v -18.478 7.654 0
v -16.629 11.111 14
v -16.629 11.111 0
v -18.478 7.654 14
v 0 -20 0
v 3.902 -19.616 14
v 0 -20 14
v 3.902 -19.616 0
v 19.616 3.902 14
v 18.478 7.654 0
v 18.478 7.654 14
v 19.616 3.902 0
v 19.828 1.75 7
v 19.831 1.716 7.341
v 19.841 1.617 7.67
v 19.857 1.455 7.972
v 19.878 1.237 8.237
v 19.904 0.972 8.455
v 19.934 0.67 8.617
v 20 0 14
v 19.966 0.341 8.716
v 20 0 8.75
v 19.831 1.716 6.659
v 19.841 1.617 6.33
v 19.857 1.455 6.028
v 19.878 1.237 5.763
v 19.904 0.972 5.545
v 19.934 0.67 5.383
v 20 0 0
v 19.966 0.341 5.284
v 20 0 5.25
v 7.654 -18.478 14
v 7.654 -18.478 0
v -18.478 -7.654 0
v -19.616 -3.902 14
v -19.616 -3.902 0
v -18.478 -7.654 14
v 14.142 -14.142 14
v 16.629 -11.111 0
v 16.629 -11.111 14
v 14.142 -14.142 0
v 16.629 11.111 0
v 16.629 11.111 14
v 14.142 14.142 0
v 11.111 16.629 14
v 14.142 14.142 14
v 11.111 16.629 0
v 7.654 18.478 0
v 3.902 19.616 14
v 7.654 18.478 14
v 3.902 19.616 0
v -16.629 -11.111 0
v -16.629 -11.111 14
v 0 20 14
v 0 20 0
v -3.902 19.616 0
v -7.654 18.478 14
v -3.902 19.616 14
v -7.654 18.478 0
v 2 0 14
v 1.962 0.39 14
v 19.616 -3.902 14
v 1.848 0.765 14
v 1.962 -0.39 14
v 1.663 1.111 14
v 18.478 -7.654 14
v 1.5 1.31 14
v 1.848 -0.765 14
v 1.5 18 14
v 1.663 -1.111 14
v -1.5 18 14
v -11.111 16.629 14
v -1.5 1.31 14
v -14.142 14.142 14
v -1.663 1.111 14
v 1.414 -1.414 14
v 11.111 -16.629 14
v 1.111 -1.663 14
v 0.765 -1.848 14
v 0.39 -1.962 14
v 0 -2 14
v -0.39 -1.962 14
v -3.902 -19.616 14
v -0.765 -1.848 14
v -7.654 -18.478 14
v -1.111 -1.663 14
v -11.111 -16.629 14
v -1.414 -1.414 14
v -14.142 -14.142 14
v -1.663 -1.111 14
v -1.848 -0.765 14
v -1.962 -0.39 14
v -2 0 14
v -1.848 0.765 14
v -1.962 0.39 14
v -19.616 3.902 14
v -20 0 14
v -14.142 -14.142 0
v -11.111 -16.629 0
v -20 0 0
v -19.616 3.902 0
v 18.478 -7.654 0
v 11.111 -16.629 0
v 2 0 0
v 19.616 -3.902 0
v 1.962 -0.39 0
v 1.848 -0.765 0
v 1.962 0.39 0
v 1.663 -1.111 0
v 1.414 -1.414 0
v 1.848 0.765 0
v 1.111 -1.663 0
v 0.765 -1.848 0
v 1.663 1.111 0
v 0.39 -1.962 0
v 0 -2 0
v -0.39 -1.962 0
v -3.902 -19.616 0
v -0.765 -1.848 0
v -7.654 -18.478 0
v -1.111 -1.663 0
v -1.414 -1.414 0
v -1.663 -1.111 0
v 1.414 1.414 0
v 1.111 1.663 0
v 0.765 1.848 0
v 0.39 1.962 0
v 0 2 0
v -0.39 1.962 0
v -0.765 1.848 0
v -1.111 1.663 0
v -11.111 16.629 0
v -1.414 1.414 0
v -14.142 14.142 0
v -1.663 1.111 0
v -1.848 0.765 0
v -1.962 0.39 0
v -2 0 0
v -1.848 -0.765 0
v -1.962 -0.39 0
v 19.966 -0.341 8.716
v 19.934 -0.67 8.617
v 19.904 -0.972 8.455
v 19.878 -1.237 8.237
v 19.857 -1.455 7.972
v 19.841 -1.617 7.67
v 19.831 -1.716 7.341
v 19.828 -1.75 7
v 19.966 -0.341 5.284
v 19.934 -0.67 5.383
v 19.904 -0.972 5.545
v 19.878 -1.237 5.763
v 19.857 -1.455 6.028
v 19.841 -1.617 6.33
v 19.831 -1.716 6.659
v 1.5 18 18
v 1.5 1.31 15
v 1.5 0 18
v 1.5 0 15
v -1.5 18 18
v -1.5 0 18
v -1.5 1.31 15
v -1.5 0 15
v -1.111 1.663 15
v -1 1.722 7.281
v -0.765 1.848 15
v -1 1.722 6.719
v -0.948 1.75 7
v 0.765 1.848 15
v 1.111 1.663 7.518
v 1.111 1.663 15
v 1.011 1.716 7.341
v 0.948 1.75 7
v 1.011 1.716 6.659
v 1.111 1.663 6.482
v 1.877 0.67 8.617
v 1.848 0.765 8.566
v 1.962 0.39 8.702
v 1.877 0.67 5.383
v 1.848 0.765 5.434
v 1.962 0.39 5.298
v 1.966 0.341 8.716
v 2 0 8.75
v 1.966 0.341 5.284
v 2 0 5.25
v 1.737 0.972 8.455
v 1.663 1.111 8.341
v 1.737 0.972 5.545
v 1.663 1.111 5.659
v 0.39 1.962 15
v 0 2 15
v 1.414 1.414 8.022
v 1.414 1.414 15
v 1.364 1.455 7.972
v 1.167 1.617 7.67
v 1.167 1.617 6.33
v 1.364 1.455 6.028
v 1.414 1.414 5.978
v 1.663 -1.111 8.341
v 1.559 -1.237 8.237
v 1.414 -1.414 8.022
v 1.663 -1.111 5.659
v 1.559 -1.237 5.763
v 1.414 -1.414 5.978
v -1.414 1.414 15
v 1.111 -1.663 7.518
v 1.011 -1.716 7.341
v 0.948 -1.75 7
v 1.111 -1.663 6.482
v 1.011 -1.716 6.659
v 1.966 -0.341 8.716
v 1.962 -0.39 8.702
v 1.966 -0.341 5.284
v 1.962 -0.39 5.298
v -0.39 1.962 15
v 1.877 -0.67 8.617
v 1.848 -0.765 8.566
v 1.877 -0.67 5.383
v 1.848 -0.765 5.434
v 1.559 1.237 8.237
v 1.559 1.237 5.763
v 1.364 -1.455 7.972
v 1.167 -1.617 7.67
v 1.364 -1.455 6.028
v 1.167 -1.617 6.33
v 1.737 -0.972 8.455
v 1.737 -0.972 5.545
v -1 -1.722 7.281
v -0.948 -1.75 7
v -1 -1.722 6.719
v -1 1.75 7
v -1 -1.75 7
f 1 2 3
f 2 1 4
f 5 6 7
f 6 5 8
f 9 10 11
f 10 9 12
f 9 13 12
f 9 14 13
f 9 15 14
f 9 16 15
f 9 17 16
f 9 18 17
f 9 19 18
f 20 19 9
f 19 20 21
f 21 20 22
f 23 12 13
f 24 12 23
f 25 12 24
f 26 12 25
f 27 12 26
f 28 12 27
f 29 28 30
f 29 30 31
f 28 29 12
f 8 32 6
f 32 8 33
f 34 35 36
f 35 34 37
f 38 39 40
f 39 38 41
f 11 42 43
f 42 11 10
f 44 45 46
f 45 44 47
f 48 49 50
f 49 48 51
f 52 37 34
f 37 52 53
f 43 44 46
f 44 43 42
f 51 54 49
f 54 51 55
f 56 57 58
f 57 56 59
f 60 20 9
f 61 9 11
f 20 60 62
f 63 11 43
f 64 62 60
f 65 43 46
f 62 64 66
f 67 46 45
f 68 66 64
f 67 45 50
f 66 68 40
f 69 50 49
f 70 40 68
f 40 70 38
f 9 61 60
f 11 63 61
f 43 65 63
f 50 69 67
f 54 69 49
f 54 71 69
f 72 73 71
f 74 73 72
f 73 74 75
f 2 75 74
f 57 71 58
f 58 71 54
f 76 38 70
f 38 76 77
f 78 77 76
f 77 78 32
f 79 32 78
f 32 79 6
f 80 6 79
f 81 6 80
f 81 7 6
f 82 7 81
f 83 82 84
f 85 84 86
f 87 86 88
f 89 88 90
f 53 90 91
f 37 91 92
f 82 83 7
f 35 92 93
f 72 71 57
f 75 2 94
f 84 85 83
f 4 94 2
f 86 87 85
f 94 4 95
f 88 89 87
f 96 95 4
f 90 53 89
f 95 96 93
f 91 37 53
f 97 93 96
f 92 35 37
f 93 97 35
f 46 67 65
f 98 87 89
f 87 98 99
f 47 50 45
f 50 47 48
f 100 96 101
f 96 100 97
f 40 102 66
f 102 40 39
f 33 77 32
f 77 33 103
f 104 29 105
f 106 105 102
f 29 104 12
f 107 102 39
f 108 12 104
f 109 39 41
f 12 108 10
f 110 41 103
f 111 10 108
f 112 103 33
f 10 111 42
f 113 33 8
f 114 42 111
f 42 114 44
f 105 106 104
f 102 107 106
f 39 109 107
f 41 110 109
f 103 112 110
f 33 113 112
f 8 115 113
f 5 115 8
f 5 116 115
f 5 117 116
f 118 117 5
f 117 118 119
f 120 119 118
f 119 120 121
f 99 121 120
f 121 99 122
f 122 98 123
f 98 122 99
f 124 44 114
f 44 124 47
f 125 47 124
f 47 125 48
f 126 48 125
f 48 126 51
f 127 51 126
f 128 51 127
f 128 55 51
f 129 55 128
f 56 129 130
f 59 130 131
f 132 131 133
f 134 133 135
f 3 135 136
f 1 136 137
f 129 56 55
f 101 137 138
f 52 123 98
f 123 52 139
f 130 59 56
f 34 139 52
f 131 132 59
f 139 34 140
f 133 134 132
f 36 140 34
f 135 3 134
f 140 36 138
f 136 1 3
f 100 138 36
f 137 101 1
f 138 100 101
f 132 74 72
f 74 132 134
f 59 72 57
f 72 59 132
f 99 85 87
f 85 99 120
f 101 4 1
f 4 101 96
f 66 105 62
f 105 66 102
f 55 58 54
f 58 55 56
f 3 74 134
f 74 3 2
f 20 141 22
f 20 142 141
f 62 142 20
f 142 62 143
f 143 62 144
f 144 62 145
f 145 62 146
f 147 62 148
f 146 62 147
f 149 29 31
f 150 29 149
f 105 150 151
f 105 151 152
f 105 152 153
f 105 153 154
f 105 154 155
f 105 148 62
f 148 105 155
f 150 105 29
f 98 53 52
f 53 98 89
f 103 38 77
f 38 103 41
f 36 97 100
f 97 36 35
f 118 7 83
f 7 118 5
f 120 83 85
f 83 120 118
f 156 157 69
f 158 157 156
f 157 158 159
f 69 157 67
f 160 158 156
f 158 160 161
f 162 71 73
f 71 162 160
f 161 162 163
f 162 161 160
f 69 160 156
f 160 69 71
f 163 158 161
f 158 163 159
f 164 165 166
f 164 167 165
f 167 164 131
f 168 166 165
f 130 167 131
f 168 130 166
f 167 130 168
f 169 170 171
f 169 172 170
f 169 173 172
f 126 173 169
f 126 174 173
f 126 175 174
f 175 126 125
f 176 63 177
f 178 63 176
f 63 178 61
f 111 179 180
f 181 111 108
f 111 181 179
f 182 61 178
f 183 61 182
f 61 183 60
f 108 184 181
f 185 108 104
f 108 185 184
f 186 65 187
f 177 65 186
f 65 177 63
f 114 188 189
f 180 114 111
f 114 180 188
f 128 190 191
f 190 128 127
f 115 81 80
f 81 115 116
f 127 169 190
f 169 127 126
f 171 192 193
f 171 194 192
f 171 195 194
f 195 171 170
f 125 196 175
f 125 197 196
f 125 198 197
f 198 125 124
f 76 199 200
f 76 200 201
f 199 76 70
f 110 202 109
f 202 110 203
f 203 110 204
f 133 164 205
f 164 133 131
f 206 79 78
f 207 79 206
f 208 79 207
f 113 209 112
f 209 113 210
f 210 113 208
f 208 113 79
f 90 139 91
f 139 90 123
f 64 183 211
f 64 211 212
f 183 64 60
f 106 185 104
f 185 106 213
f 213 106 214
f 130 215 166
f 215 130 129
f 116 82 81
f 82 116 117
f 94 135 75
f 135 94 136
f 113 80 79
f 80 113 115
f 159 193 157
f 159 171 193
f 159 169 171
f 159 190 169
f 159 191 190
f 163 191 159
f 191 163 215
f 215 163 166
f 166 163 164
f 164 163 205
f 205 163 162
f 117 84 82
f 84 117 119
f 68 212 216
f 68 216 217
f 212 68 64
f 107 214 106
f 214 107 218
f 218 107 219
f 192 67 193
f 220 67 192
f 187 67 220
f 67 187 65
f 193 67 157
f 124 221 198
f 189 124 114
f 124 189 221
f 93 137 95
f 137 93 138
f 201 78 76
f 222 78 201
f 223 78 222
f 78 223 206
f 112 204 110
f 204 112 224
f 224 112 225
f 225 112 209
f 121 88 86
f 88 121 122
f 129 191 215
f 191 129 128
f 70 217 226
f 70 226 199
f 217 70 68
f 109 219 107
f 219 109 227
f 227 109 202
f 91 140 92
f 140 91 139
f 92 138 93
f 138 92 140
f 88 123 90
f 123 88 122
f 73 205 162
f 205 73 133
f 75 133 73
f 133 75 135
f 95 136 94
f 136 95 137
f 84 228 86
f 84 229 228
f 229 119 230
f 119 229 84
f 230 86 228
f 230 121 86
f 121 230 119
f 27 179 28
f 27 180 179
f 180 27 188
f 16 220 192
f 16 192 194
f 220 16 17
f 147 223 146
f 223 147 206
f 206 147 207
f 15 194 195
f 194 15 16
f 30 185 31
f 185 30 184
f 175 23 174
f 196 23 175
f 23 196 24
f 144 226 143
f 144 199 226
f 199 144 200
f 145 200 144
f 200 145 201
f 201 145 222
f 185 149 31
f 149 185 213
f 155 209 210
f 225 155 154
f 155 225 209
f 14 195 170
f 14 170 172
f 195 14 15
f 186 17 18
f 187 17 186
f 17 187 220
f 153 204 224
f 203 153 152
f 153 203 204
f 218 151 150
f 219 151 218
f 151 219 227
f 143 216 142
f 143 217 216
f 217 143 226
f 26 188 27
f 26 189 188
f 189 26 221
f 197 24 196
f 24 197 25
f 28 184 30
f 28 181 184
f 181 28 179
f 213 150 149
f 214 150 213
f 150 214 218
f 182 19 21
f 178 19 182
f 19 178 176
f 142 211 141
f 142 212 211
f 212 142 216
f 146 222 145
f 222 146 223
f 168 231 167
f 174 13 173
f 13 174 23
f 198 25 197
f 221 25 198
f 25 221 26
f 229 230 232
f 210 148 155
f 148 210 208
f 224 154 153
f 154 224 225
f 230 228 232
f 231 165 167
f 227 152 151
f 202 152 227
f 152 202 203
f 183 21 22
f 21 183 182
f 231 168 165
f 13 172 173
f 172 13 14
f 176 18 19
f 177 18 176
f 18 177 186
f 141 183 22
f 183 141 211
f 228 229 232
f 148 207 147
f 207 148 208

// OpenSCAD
$fn = 32;

// ----------------------------------------------------------------------
// Control knob: pointer knob
// ----------------------------------------------------------------------

// --- parameters (mm) ---
rib_w = 3;                // pointer rib width
rib_h = 5;                // pointer rib height
knob_d = 40;              // knob body diameter
knob_h = 14;              // knob body height
bore_d = 4;               // shaft bore diameter
set_d = 3.5;              // set screw bore diameter

rib_poke = rib_h - 1;  // rib height above the top
total_h = knob_h + rib_h - 1;  // overall height

difference() {
  union() {
    cylinder(h = knob_h, d = knob_d);
    translate([-rib_w / 2, 0, knob_h - 1])
      cube([rib_w, knob_d / 2 - 2, rib_h]);
  }
  translate([0, 0, -1]) cylinder(h = knob_h + 2, d = bore_d);
  translate([-1, 0, knob_h / 2]) rotate([0, 90, 0])
    cylinder(h = knob_d / 2 + bore_d / 2 + 2, d = set_d);}
